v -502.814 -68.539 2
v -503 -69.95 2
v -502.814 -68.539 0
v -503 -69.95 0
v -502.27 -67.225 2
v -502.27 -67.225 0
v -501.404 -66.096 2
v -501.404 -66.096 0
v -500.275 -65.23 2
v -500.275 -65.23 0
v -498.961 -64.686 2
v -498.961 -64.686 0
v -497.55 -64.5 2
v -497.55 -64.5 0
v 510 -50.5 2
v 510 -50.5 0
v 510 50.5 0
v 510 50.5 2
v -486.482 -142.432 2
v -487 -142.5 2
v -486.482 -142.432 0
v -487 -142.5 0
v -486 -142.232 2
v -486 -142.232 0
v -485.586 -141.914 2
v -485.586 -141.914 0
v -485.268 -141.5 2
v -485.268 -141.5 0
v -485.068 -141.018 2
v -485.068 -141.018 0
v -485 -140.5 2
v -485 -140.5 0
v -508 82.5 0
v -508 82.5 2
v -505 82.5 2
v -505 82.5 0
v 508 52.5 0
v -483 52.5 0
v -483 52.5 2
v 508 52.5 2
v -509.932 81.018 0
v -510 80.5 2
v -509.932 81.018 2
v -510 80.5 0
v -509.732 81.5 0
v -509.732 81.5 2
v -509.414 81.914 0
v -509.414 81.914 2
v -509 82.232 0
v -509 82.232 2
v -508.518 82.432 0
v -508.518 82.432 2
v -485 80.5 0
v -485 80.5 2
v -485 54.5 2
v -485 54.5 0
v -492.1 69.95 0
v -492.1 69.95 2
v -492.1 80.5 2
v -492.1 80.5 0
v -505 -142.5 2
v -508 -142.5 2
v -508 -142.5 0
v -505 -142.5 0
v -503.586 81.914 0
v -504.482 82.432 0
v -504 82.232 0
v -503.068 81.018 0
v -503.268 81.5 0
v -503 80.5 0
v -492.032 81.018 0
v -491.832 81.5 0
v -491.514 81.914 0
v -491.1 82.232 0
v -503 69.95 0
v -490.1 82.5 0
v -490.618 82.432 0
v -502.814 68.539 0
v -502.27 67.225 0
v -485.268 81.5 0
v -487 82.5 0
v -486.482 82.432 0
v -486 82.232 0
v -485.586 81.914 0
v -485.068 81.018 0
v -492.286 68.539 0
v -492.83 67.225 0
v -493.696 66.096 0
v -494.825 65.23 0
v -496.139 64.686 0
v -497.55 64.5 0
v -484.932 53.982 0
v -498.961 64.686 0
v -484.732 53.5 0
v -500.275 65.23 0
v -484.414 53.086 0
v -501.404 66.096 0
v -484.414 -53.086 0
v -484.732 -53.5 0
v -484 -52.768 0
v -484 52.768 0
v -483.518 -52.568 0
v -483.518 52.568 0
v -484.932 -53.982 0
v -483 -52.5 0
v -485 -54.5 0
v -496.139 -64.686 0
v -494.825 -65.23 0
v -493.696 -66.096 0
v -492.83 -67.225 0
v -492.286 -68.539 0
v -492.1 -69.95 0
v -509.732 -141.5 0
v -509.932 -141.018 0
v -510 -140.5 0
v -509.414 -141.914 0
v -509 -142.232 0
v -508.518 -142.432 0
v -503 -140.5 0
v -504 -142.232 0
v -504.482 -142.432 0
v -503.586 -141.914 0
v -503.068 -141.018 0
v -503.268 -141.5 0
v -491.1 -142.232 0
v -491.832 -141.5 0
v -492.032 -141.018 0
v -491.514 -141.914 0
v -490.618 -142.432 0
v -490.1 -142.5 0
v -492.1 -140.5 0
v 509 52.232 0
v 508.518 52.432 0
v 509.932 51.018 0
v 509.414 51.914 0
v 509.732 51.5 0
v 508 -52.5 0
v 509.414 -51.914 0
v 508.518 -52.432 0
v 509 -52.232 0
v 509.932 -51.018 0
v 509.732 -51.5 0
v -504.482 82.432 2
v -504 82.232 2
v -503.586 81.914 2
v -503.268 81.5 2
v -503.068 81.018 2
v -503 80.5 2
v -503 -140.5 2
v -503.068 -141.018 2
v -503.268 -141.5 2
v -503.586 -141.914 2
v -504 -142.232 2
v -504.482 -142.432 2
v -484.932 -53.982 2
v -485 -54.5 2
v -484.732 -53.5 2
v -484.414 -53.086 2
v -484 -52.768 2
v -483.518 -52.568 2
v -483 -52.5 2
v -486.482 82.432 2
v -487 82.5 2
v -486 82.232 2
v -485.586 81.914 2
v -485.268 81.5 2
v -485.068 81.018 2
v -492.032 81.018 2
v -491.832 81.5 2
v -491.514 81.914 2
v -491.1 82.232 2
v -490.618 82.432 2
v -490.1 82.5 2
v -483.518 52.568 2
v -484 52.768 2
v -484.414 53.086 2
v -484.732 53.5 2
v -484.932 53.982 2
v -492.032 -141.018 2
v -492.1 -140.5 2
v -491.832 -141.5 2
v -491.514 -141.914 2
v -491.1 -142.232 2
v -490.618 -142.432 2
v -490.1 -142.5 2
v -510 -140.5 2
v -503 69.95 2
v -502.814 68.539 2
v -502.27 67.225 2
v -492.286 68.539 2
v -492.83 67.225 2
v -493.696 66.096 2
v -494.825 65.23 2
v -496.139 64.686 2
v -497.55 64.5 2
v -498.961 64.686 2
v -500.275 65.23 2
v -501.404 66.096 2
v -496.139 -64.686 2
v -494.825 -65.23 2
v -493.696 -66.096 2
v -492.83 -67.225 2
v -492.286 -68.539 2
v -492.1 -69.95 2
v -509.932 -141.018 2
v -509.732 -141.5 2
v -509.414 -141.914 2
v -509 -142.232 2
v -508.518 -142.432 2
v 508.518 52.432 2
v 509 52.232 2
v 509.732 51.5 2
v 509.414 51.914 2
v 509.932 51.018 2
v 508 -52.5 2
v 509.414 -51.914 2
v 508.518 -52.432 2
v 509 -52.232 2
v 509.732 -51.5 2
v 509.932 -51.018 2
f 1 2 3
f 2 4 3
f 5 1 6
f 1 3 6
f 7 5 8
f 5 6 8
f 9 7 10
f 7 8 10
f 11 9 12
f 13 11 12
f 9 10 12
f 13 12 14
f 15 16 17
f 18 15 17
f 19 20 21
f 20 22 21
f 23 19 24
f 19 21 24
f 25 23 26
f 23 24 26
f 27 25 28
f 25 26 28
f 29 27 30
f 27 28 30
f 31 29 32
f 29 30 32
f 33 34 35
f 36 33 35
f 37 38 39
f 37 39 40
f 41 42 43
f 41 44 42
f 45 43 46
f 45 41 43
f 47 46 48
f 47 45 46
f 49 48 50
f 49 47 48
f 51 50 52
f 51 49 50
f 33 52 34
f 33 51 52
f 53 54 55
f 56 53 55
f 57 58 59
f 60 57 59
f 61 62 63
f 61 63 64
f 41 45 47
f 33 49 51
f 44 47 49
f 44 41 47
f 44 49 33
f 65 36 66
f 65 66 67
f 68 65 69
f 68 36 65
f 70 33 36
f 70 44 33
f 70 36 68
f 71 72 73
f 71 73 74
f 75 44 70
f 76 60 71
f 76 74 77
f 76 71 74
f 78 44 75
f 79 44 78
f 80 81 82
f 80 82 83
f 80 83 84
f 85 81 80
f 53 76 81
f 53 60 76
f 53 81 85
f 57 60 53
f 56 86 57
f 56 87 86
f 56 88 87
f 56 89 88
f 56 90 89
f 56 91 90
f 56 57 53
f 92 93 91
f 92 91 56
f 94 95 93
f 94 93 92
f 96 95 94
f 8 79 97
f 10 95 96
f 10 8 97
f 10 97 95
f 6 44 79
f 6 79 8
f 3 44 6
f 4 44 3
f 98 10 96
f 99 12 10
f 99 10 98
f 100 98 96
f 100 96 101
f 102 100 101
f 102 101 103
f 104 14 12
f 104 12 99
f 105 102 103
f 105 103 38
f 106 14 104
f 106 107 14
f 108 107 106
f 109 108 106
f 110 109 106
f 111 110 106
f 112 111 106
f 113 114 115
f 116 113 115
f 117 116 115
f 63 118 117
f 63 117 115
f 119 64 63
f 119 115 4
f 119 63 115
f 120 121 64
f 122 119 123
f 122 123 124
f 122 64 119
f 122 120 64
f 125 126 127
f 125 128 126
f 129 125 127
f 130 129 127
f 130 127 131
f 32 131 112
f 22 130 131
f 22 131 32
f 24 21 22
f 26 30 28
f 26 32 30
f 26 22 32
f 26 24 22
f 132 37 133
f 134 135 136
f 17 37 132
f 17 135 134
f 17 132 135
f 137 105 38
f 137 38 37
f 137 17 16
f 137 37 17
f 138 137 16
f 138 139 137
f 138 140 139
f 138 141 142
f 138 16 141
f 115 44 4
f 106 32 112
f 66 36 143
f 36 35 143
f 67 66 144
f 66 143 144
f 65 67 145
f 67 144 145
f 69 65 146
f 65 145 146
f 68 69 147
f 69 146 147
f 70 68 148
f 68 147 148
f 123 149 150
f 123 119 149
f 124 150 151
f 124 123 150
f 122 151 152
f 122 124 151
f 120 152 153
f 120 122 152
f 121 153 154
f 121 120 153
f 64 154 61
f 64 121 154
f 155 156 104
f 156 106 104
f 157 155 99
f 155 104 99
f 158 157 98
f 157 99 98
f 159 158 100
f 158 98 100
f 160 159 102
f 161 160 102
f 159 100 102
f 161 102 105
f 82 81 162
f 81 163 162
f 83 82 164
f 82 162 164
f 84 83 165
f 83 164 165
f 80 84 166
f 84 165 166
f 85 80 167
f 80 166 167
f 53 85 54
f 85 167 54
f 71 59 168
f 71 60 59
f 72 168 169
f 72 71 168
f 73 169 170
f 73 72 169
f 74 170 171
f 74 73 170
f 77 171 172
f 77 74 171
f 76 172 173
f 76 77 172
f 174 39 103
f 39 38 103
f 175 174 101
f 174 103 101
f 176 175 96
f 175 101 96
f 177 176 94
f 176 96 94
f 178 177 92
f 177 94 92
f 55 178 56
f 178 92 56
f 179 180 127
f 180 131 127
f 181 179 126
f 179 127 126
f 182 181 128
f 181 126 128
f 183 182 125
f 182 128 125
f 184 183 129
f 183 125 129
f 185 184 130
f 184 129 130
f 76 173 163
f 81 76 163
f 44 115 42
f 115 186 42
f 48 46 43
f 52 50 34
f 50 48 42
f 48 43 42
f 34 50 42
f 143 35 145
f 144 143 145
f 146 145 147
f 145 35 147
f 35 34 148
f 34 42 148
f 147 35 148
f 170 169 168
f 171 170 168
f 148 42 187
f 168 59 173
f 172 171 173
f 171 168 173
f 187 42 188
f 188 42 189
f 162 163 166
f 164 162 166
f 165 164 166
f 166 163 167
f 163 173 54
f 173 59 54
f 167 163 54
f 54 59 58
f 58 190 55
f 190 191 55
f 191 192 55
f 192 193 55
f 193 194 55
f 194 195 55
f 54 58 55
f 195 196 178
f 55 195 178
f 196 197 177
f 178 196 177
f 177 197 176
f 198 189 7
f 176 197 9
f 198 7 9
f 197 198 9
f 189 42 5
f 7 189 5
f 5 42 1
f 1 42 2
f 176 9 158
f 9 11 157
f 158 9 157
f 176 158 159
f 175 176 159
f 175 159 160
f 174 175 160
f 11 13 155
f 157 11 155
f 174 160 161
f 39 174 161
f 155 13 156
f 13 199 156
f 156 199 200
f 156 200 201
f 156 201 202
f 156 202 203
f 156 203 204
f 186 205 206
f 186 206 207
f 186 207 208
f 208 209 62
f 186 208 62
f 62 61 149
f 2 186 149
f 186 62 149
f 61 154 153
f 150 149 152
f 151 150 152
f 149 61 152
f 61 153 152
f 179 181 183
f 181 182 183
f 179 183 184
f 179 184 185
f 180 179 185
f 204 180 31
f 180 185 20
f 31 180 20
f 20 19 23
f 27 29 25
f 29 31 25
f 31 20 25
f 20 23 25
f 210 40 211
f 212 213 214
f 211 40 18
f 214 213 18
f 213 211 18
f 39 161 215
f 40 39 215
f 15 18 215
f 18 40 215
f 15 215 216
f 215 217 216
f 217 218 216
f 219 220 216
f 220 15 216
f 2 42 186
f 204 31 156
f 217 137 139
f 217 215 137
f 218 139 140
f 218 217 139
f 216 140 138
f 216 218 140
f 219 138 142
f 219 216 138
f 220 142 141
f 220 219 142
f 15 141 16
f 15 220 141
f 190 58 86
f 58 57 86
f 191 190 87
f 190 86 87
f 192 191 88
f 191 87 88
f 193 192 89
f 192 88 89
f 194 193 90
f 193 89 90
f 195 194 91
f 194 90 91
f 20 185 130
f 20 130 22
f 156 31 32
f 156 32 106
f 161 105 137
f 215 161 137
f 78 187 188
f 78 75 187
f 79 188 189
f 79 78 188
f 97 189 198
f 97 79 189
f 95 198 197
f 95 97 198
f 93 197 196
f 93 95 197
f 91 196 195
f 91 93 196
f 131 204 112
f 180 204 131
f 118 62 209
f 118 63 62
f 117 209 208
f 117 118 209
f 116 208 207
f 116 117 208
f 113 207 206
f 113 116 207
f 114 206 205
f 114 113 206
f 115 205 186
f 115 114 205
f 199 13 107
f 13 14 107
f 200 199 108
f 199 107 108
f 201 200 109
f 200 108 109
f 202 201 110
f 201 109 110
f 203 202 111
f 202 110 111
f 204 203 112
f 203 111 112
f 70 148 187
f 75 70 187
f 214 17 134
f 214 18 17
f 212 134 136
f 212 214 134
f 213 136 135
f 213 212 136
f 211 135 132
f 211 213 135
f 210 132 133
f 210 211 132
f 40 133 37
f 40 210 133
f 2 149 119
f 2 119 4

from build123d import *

# Parameters (mm, degrees)
F0_W     = 1020
F0_H     = 105
F1_DEPTH = 2
F3_DEPTH = 2
F6_W     = 69.2964494228
F6_H     = 80
F7_DEPTH = 2.001
F8_R     = 5.44999
F9_R     = 2


# Not quite as in the source:
# - a fillet or chamfer is up to 0.001 mm smaller than in the source, because OpenCascade refuses the exact size


with BuildPart() as f1:
    # F0 (on Top) → F1 (new body)
    with BuildSketch(Plane.XY):
        Rectangle(F0_W, F0_H)
    extrude(amount=F1_DEPTH)

    # F2 (on face) → F3 (join)
    with BuildSketch(Plane.XY.offset(2)):
        Polygon((-485, -52.5), (-510, -52.5), (-510, -142.5), (-503, -142.5), (-503, -64.5), (-492.1, -64.5), (-492.1, -142.5), (-485, -142.5), align=None)
    extrude(amount=-F3_DEPTH)

    # F5: F1 across plane


with BuildPart() as f1_1:
    add(f1.part)
    add(f1.part.mirror(Plane.XZ))

    # F6 (on face) → F7 (cut, through all)
    with BuildSketch(Plane.XY.offset(2)):
        with Locations((-500.6258040667, 122.5)):
            Rectangle(F6_W, F6_H)
    extrude(amount=-F7_DEPTH, mode=Mode.SUBTRACT)

    # F8 (radius 5.45 in the source; OpenCascade refuses exactly that, so slightly less here)
    f8_edges = [f1_1.edges().sort_by_distance(p)[0] for p in [
        (-503, -64.5, 1),
        (-492.1, -64.5, 1),
        (-503, 64.5, 1),
        (-492.1, 64.5, 1),
    ]]
    fillet(f8_edges, radius=F8_R)

    # F9
    f9_edges = [f1_1.edges().sort_by_distance(p)[0] for p in [
        (-485, 52.5, 1),
        (-485, 82.5, 1),
        (-492.1, 82.5, 1),
        (-503, 82.5, 1),
        (-510, 82.5, 1),
        (-485, -52.5, 1),
        (-485, -142.5, 1),
        (-492.1, -142.5, 1),
        (-503, -142.5, 1),
        (-510, -142.5, 1),
        (510, -52.5, 1),
        (510, 52.5, 1),
    ]]
    fillet(f9_edges, radius=F9_R)


solid = f1_1.part
